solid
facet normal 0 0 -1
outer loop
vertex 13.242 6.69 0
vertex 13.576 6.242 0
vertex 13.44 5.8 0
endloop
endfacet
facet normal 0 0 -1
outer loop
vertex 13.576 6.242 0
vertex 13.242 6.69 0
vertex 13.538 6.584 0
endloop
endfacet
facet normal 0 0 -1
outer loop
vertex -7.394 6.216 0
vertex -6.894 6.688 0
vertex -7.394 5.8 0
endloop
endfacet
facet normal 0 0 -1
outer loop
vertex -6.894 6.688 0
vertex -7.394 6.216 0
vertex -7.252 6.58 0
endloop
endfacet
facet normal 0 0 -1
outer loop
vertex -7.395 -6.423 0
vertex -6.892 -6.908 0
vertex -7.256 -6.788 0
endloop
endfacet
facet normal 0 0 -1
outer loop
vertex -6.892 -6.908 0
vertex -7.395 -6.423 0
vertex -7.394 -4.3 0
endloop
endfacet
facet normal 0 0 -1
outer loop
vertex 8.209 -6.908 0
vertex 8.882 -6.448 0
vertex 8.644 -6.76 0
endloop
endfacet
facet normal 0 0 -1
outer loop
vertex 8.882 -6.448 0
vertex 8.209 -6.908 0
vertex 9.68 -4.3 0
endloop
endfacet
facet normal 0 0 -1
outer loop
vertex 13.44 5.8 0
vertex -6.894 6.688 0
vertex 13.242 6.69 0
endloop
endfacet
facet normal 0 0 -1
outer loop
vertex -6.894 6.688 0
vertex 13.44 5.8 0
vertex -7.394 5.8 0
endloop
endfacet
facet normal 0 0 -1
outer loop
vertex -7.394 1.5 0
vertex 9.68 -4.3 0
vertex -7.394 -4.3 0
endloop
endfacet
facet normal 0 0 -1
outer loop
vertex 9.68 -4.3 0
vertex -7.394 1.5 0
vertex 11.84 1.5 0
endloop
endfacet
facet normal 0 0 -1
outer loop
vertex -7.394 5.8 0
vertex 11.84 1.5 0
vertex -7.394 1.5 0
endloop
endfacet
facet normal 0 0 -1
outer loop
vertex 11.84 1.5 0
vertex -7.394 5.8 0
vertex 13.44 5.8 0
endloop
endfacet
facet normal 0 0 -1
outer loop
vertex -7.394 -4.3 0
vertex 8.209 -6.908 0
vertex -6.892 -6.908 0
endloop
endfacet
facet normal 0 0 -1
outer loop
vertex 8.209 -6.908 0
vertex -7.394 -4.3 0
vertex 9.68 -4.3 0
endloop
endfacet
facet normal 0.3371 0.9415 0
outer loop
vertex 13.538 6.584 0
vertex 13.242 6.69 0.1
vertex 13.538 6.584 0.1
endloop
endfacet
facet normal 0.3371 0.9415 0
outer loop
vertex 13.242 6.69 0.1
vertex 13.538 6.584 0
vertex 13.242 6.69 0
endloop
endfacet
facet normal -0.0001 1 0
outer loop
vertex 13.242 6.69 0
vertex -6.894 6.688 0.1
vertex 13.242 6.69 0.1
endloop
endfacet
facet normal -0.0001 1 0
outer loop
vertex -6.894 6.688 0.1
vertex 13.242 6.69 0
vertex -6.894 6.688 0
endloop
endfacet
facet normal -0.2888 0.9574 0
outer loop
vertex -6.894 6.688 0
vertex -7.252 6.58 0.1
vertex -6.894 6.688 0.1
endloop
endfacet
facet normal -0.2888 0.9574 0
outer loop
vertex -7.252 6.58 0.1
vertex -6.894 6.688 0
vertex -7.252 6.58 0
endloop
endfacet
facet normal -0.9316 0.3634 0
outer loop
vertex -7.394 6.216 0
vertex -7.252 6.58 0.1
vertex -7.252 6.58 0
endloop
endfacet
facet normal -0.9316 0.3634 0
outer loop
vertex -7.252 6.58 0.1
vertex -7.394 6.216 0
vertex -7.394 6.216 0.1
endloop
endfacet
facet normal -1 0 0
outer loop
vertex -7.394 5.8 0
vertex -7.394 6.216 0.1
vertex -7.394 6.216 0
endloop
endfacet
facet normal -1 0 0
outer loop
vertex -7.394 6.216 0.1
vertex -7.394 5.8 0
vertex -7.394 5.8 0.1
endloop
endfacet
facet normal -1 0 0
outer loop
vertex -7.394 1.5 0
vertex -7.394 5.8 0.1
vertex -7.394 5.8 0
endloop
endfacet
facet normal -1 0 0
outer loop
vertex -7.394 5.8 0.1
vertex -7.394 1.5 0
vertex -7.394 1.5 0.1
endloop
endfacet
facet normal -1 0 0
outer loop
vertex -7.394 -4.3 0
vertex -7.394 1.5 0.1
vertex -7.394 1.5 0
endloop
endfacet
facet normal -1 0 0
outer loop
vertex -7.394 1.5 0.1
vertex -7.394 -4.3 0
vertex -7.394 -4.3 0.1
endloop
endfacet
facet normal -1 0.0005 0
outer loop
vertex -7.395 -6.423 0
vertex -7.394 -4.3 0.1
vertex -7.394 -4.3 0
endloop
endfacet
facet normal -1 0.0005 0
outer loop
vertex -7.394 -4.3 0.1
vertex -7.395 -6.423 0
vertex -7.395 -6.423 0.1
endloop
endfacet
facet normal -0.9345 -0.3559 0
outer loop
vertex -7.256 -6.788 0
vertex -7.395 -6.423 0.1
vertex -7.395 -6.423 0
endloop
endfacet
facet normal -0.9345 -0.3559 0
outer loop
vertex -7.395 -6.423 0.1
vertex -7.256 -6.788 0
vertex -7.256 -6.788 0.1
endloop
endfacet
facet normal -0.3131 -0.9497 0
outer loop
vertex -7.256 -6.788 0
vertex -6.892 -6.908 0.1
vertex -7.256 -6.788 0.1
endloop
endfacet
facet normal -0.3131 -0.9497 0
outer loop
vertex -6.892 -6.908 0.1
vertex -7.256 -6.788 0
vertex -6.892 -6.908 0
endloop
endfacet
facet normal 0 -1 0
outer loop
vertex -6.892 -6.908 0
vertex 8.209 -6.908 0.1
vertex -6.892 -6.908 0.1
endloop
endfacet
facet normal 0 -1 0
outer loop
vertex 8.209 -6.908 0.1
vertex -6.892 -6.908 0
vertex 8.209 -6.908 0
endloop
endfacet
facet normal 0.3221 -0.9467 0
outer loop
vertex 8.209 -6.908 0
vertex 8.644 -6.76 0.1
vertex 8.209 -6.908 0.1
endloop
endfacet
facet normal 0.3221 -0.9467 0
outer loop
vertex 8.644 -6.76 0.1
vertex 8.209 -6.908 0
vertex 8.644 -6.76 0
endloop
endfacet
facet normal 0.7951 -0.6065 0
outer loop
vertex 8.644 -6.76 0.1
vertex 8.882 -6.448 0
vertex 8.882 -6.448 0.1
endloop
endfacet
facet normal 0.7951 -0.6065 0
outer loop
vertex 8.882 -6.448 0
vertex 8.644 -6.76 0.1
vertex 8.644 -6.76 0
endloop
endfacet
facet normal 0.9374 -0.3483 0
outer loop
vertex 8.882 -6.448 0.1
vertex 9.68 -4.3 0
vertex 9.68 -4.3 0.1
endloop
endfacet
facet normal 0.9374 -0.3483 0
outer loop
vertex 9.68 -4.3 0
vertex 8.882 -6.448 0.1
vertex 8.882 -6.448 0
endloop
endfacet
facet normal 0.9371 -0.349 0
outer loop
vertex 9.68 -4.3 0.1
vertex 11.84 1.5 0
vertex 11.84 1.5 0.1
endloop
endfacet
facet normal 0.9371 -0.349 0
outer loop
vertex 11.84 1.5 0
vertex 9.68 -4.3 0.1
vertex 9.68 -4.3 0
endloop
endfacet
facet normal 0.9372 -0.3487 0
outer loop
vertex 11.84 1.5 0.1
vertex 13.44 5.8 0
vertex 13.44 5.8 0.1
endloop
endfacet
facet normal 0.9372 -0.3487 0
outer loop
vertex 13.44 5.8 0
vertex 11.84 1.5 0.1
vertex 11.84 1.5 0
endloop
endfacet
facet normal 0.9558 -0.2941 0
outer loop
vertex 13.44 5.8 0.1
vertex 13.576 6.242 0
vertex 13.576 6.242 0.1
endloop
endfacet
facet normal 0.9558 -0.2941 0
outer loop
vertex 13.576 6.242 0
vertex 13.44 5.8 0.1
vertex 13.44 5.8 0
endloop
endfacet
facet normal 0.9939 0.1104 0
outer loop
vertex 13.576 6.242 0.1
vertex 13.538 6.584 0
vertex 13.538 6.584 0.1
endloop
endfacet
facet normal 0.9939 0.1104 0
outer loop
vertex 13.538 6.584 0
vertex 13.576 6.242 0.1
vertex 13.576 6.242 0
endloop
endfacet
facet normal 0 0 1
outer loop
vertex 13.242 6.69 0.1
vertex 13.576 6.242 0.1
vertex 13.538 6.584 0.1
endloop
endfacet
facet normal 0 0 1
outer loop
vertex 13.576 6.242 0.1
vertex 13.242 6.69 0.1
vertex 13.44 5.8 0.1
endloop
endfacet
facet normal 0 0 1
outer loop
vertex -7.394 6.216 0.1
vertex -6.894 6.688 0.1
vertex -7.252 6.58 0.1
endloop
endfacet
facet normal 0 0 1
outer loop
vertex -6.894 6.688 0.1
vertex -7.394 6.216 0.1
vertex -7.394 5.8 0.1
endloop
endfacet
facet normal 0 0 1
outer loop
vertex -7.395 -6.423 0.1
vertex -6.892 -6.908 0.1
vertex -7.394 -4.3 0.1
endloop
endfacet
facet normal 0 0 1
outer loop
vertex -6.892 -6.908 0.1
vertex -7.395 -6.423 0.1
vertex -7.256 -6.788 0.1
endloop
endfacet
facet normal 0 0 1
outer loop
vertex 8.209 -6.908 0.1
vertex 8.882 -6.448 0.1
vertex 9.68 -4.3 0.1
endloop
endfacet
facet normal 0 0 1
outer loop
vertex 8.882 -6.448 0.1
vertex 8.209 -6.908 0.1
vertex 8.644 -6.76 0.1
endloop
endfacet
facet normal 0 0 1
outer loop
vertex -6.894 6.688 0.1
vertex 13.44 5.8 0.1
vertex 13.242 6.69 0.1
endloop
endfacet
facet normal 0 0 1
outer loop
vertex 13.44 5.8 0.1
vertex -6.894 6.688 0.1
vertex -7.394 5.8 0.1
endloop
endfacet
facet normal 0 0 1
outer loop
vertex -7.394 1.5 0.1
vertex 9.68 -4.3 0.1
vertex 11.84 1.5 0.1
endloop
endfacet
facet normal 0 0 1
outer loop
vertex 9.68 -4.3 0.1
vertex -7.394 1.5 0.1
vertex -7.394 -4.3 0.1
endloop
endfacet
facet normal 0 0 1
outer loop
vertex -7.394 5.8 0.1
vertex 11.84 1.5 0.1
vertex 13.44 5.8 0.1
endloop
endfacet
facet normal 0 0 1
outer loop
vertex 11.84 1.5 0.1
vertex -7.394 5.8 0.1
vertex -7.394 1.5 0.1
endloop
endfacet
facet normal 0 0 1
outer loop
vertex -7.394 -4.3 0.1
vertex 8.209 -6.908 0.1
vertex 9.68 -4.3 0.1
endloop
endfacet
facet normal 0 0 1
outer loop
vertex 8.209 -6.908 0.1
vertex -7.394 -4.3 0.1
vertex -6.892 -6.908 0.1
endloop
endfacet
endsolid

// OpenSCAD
// file: s/13710ks02.scad
use <../../lib.scad>
function ldraw_lib__s__13710ks02() = [
// 0 ~Sticker Top for Technic Beam  3 with Panel Fairing (Flat)
// 0 Name: s\13710ks02.dat
// 0 Author: Philippe Hurbain [Philo]
// 0 !LDRAW_ORG Subpart UPDATE 2022-02
// 0 !LICENSE Licensed under CC BY 2.0 and CC BY 4.0 : see CAreadme.txt
// 
// 0 BFC CERTIFY CCW
  [0,"BFC","CERTIFY"],
  [0,"BFC","CCW"],
// 
// 0 !HISTORY 2022-03-06 [PTadmin] Official Update 2022-02
// 
// 
// 0 // Top surface
// 
// 4 16 33.94 -0.25 15.604 33.845 -0.25 16.459 33.105 -0.25 16.725 33.6 -0.25 14.5
  [4,16,33.94,-0.25,15.604,33.845,-0.25,16.459,33.105,-0.25,16.725,33.6,-0.25,14.5],
// 4 16 -17.236 -0.25 16.721 -18.13 -0.25 16.45 -18.484 -0.25 15.539 -18.484 -0.25 14.5
  [4,16,-17.236,-0.25,16.721,-18.13,-0.25,16.45,-18.484,-0.25,15.539,-18.484,-0.25,14.5],
// 4 16 -18.487 -0.25 -16.058 -18.14 -0.25 -16.971 -17.23 -0.25 -17.27 -18.484 -0.25 -10.75
  [4,16,-18.487,-0.25,-16.058,-18.14,-0.25,-16.971,-17.23,-0.25,-17.27,-18.484,-0.25,-10.75],
// 4 16 20.522 -0.25 -17.269 21.61 -0.25 -16.899 22.205 -0.25 -16.121 24.2 -0.25 -10.75
  [4,16,20.522,-0.25,-17.269,21.61,-0.25,-16.899,22.205,-0.25,-16.121,24.2,-0.25,-10.75],
// 4 16 33.6 -0.25 14.5 33.105 -0.25 16.725 -17.236 -0.25 16.721 -18.484 -0.25 14.5
  [4,16,33.6,-0.25,14.5,33.105,-0.25,16.725,-17.236,-0.25,16.721,-18.484,-0.25,14.5],
// 4 16 -18.484 -0.25 -10.75 24.2 -0.25 -10.75 29.6 -0.25 3.75 -18.484 -0.25 3.75
  [4,16,-18.484,-0.25,-10.75,24.2,-0.25,-10.75,29.6,-0.25,3.75,-18.484,-0.25,3.75],
// 4 16 33.6 -0.25 14.5 -18.484 -0.25 14.5 -18.484 -0.25 3.75 29.6 -0.25 3.75
  [4,16,33.6,-0.25,14.5,-18.484,-0.25,14.5,-18.484,-0.25,3.75,29.6,-0.25,3.75],
// 4 16 24.2 -0.25 -10.75 -18.484 -0.25 -10.75 -17.23 -0.25 -17.27 20.522 -0.25 -17.269
  [4,16,24.2,-0.25,-10.75,-18.484,-0.25,-10.75,-17.23,-0.25,-17.27,20.522,-0.25,-17.269],
];
module ldraw_lib__s__13710ks02(step=0, col=false, unit=2/5, alt=false, line=0.2, solid=!$preview)
    makepoly(ldraw_lib__s__13710ks02(), step=step, col=col, unit=unit, alt=alt, line=line, solid=solid);
ldraw_lib__s__13710ks02(line=0.2);
// file: s/13710ks01.scad
use <../../lib.scad>
use <13710ks02.scad>
function ldraw_lib__s__13710ks01() = [
// 0 ~Sticker Bottom for Technic Beam  3 with Panel Fairing (Flat)
// 0 Name: s\13710ks01.dat
// 0 Author: Philippe Hurbain [Philo]
// 0 !LDRAW_ORG Subpart UPDATE 2022-02
// 0 !LICENSE Licensed under CC BY 2.0 and CC BY 4.0 : see CAreadme.txt
// 
// 0 BFC CERTIFY CCW
  [0,"BFC","CERTIFY"],
  [0,"BFC","CCW"],
// 
// 0 !HISTORY 2022-03-06 [PTadmin] Official Update 2022-02
// 
// 
// 0 // Bottom surface
// 1 16 0 -0.25 0 1 0 0 0 -1 0 0 0 1 s\13710ks02.dat
  [1,16,0,-0.25,0,1,0,0,0,-1,0,0,0,1, ldraw_lib__s__13710ks02()],
// 0 // Edge surface
// 4 16 33.845 0 16.459 33.105 0 16.725 33.105 -0.25 16.725 33.845 -0.25 16.459
  [4,16,33.845,0,16.459,33.105,0,16.725,33.105,-0.25,16.725,33.845,-0.25,16.459],
// 4 16 33.105 0 16.725 -17.236 0 16.721 -17.236 -0.25 16.721 33.105 -0.25 16.725
  [4,16,33.105,0,16.725,-17.236,0,16.721,-17.236,-0.25,16.721,33.105,-0.25,16.725],
// 4 16 -17.236 0 16.721 -18.13 0 16.45 -18.13 -0.25 16.45 -17.236 -0.25 16.721
  [4,16,-17.236,0,16.721,-18.13,0,16.45,-18.13,-0.25,16.45,-17.236,-0.25,16.721],
// 4 16 -18.13 0 16.45 -18.484 0 15.539 -18.484 -0.25 15.539 -18.13 -0.25 16.45
  [4,16,-18.13,0,16.45,-18.484,0,15.539,-18.484,-0.25,15.539,-18.13,-0.25,16.45],
// 4 16 -18.484 0 15.539 -18.484 0 14.5 -18.484 -0.25 14.5 -18.484 -0.25 15.539
  [4,16,-18.484,0,15.539,-18.484,0,14.5,-18.484,-0.25,14.5,-18.484,-0.25,15.539],
// 4 16 -18.484 0 14.5 -18.484 0 3.75 -18.484 -0.25 3.75 -18.484 -0.25 14.5
  [4,16,-18.484,0,14.5,-18.484,0,3.75,-18.484,-0.25,3.75,-18.484,-0.25,14.5],
// 4 16 -18.484 0 3.75 -18.484 0 -10.75 -18.484 -0.25 -10.75 -18.484 -0.25 3.75
  [4,16,-18.484,0,3.75,-18.484,0,-10.75,-18.484,-0.25,-10.75,-18.484,-0.25,3.75],
// 4 16 -18.484 0 -10.75 -18.487 0 -16.058 -18.487 -0.25 -16.058 -18.484 -0.25 -10.75
  [4,16,-18.484,0,-10.75,-18.487,0,-16.058,-18.487,-0.25,-16.058,-18.484,-0.25,-10.75],
// 4 16 -18.487 0 -16.058 -18.14 0 -16.971 -18.14 -0.25 -16.971 -18.487 -0.25 -16.058
  [4,16,-18.487,0,-16.058,-18.14,0,-16.971,-18.14,-0.25,-16.971,-18.487,-0.25,-16.058],
// 4 16 -18.14 0 -16.971 -17.23 0 -17.27 -17.23 -0.25 -17.27 -18.14 -0.25 -16.971
  [4,16,-18.14,0,-16.971,-17.23,0,-17.27,-17.23,-0.25,-17.27,-18.14,-0.25,-16.971],
// 4 16 -17.23 0 -17.27 20.522 0 -17.269 20.522 -0.25 -17.269 -17.23 -0.25 -17.27
  [4,16,-17.23,0,-17.27,20.522,0,-17.269,20.522,-0.25,-17.269,-17.23,-0.25,-17.27],
// 4 16 20.522 0 -17.269 21.61 0 -16.899 21.61 -0.25 -16.899 20.522 -0.25 -17.269
  [4,16,20.522,0,-17.269,21.61,0,-16.899,21.61,-0.25,-16.899,20.522,-0.25,-17.269],
// 4 16 21.61 0 -16.899 22.205 0 -16.121 22.205 -0.25 -16.121 21.61 -0.25 -16.899
  [4,16,21.61,0,-16.899,22.205,0,-16.121,22.205,-0.25,-16.121,21.61,-0.25,-16.899],
// 4 16 22.205 0 -16.121 24.2 0 -10.75 24.2 -0.25 -10.75 22.205 -0.25 -16.121
  [4,16,22.205,0,-16.121,24.2,0,-10.75,24.2,-0.25,-10.75,22.205,-0.25,-16.121],
// 4 16 24.2 0 -10.75 29.6 0 3.75 29.6 -0.25 3.75 24.2 -0.25 -10.75
  [4,16,24.2,0,-10.75,29.6,0,3.75,29.6,-0.25,3.75,24.2,-0.25,-10.75],
// 4 16 29.6 0 3.75 33.6 0 14.5 33.6 -0.25 14.5 29.6 -0.25 3.75
  [4,16,29.6,0,3.75,33.6,0,14.5,33.6,-0.25,14.5,29.6,-0.25,3.75],
// 4 16 33.6 0 14.5 33.94 0 15.604 33.94 -0.25 15.604 33.6 -0.25 14.5
  [4,16,33.6,0,14.5,33.94,0,15.604,33.94,-0.25,15.604,33.6,-0.25,14.5],
// 4 16 33.94 0 15.604 33.845 0 16.459 33.845 -0.25 16.459 33.94 -0.25 15.604
  [4,16,33.94,0,15.604,33.845,0,16.459,33.845,-0.25,16.459,33.94,-0.25,15.604],
// 5 24 33.105 0 16.725 33.105 -0.25 16.725 33.845 0 16.459 -17.236 0 16.721
  [5,24,33.105,0,16.725,33.105,-0.25,16.725,33.845,0,16.459,-17.236,0,16.721],
// 5 24 33.845 -0.25 16.459 33.845 0 16.459 33.105 0 16.725 33.94 0 15.604
  [5,24,33.845,-0.25,16.459,33.845,0,16.459,33.105,0,16.725,33.94,0,15.604],
// 5 24 -17.236 0 16.721 -17.236 -0.25 16.721 33.105 0 16.725 -18.13 0 16.45
  [5,24,-17.236,0,16.721,-17.236,-0.25,16.721,33.105,0,16.725,-18.13,0,16.45],
// 5 24 -18.13 0 16.45 -18.13 -0.25 16.45 -17.236 0 16.721 -18.484 0 15.539
  [5,24,-18.13,0,16.45,-18.13,-0.25,16.45,-17.236,0,16.721,-18.484,0,15.539],
// 5 24 -18.484 0 15.539 -18.484 -0.25 15.539 -18.13 0 16.45 -18.484 0 14.5
  [5,24,-18.484,0,15.539,-18.484,-0.25,15.539,-18.13,0,16.45,-18.484,0,14.5],
// 5 24 -18.487 0 -16.058 -18.487 -0.25 -16.058 -18.484 0 -10.75 -18.14 0 -16.971
  [5,24,-18.487,0,-16.058,-18.487,-0.25,-16.058,-18.484,0,-10.75,-18.14,0,-16.971],
// 5 24 -18.14 0 -16.971 -18.14 -0.25 -16.971 -18.487 0 -16.058 -17.23 0 -17.27
  [5,24,-18.14,0,-16.971,-18.14,-0.25,-16.971,-18.487,0,-16.058,-17.23,0,-17.27],
// 5 24 -17.23 0 -17.27 -17.23 -0.25 -17.27 -18.14 0 -16.971 20.522 0 -17.269
  [5,24,-17.23,0,-17.27,-17.23,-0.25,-17.27,-18.14,0,-16.971,20.522,0,-17.269],
// 5 24 20.522 0 -17.269 20.522 -0.25 -17.269 -17.23 0 -17.27 21.61 0 -16.899
  [5,24,20.522,0,-17.269,20.522,-0.25,-17.269,-17.23,0,-17.27,21.61,0,-16.899],
// 5 24 21.61 0 -16.899 21.61 -0.25 -16.899 20.522 0 -17.269 22.205 0 -16.121
  [5,24,21.61,0,-16.899,21.61,-0.25,-16.899,20.522,0,-17.269,22.205,0,-16.121],
// 5 24 22.205 0 -16.121 22.205 -0.25 -16.121 21.61 0 -16.899 24.2 0 -10.75
  [5,24,22.205,0,-16.121,22.205,-0.25,-16.121,21.61,0,-16.899,24.2,0,-10.75],
// 5 24 33.6 0 14.5 33.6 -0.25 14.5 29.6 0 3.75 33.94 0 15.604
  [5,24,33.6,0,14.5,33.6,-0.25,14.5,29.6,0,3.75,33.94,0,15.604],
// 5 24 33.94 0 15.604 33.94 -0.25 15.604 33.6 0 14.5 33.845 0 16.459
  [5,24,33.94,0,15.604,33.94,-0.25,15.604,33.6,0,14.5,33.845,0,16.459],
];
module ldraw_lib__s__13710ks01(step=0, col=false, unit=2/5, alt=false, line=0.2, solid=!$preview)
    makepoly(ldraw_lib__s__13710ks01(), step=step, col=col, unit=unit, alt=alt, line=line, solid=solid);
ldraw_lib__s__13710ks01(line=0.2);
// main file
use <../lib.scad>
use <s/13710ks01.scad>
use <s/13710ks02.scad>
function ldraw_lib__13710l() = [
// 0 Sticker Mindstorms EV3 #12 for Beam 3 / Fairing Left (Flat) (Needs Work)
// 0 Name: 13710l.dat
// 0 Author: Philippe Hurbain [Philo]
// 0 !LDRAW_ORG Part UPDATE 2022-02
// 0 !LICENSE Licensed under CC BY 2.0 and CC BY 4.0 : see CAreadme.txt
// 
// 0 !HELP To be used with panel 61071
// 
// 0 BFC CERTIFY CCW
  [0,"BFC","CERTIFY"],
  [0,"BFC","CCW"],
// 
// 0 !HISTORY 2022-03-06 [PTadmin] Official Update 2022-02
// 
// 
// 0 // Image file courtesy of the LEGO MINDSTORMS Team
// 0 // Needs Work: Missing more detailed fallback pattern
// 
// 1 16 0 0 0 1 0 0 0 1 0 0 0 1 s\13710ks01.dat
  [1,16,0,0,0,1,0,0,0,1,0,0,0,1, ldraw_lib__s__13710ks01()],
// 0 !TEXMAP START PLANAR -18.484 10 16.725 33.94 10 16.725 -18.484 10 -17.27 13710l.png
// 0 !: 1 15 0 0 0 1 0 0 0 1 0 0 0 1 s\13710ks02.dat
// 0 !TEXMAP FALLBACK
// 1 15 0 0 0 1 0 0 0 1 0 0 0 1 s\13710ks02.dat
  [1,15,0,0,0,1,0,0,0,1,0,0,0,1, ldraw_lib__s__13710ks02()],
// 0 !TEXMAP END
];
module ldraw_lib__13710l(step=0, col=false, unit=2/5, alt=false, line=0.2, solid=!$preview)
    makepoly(ldraw_lib__13710l(), step=step, col=col, unit=unit, alt=alt, line=line, solid=solid);
ldraw_lib__13710l(line=0.2);
